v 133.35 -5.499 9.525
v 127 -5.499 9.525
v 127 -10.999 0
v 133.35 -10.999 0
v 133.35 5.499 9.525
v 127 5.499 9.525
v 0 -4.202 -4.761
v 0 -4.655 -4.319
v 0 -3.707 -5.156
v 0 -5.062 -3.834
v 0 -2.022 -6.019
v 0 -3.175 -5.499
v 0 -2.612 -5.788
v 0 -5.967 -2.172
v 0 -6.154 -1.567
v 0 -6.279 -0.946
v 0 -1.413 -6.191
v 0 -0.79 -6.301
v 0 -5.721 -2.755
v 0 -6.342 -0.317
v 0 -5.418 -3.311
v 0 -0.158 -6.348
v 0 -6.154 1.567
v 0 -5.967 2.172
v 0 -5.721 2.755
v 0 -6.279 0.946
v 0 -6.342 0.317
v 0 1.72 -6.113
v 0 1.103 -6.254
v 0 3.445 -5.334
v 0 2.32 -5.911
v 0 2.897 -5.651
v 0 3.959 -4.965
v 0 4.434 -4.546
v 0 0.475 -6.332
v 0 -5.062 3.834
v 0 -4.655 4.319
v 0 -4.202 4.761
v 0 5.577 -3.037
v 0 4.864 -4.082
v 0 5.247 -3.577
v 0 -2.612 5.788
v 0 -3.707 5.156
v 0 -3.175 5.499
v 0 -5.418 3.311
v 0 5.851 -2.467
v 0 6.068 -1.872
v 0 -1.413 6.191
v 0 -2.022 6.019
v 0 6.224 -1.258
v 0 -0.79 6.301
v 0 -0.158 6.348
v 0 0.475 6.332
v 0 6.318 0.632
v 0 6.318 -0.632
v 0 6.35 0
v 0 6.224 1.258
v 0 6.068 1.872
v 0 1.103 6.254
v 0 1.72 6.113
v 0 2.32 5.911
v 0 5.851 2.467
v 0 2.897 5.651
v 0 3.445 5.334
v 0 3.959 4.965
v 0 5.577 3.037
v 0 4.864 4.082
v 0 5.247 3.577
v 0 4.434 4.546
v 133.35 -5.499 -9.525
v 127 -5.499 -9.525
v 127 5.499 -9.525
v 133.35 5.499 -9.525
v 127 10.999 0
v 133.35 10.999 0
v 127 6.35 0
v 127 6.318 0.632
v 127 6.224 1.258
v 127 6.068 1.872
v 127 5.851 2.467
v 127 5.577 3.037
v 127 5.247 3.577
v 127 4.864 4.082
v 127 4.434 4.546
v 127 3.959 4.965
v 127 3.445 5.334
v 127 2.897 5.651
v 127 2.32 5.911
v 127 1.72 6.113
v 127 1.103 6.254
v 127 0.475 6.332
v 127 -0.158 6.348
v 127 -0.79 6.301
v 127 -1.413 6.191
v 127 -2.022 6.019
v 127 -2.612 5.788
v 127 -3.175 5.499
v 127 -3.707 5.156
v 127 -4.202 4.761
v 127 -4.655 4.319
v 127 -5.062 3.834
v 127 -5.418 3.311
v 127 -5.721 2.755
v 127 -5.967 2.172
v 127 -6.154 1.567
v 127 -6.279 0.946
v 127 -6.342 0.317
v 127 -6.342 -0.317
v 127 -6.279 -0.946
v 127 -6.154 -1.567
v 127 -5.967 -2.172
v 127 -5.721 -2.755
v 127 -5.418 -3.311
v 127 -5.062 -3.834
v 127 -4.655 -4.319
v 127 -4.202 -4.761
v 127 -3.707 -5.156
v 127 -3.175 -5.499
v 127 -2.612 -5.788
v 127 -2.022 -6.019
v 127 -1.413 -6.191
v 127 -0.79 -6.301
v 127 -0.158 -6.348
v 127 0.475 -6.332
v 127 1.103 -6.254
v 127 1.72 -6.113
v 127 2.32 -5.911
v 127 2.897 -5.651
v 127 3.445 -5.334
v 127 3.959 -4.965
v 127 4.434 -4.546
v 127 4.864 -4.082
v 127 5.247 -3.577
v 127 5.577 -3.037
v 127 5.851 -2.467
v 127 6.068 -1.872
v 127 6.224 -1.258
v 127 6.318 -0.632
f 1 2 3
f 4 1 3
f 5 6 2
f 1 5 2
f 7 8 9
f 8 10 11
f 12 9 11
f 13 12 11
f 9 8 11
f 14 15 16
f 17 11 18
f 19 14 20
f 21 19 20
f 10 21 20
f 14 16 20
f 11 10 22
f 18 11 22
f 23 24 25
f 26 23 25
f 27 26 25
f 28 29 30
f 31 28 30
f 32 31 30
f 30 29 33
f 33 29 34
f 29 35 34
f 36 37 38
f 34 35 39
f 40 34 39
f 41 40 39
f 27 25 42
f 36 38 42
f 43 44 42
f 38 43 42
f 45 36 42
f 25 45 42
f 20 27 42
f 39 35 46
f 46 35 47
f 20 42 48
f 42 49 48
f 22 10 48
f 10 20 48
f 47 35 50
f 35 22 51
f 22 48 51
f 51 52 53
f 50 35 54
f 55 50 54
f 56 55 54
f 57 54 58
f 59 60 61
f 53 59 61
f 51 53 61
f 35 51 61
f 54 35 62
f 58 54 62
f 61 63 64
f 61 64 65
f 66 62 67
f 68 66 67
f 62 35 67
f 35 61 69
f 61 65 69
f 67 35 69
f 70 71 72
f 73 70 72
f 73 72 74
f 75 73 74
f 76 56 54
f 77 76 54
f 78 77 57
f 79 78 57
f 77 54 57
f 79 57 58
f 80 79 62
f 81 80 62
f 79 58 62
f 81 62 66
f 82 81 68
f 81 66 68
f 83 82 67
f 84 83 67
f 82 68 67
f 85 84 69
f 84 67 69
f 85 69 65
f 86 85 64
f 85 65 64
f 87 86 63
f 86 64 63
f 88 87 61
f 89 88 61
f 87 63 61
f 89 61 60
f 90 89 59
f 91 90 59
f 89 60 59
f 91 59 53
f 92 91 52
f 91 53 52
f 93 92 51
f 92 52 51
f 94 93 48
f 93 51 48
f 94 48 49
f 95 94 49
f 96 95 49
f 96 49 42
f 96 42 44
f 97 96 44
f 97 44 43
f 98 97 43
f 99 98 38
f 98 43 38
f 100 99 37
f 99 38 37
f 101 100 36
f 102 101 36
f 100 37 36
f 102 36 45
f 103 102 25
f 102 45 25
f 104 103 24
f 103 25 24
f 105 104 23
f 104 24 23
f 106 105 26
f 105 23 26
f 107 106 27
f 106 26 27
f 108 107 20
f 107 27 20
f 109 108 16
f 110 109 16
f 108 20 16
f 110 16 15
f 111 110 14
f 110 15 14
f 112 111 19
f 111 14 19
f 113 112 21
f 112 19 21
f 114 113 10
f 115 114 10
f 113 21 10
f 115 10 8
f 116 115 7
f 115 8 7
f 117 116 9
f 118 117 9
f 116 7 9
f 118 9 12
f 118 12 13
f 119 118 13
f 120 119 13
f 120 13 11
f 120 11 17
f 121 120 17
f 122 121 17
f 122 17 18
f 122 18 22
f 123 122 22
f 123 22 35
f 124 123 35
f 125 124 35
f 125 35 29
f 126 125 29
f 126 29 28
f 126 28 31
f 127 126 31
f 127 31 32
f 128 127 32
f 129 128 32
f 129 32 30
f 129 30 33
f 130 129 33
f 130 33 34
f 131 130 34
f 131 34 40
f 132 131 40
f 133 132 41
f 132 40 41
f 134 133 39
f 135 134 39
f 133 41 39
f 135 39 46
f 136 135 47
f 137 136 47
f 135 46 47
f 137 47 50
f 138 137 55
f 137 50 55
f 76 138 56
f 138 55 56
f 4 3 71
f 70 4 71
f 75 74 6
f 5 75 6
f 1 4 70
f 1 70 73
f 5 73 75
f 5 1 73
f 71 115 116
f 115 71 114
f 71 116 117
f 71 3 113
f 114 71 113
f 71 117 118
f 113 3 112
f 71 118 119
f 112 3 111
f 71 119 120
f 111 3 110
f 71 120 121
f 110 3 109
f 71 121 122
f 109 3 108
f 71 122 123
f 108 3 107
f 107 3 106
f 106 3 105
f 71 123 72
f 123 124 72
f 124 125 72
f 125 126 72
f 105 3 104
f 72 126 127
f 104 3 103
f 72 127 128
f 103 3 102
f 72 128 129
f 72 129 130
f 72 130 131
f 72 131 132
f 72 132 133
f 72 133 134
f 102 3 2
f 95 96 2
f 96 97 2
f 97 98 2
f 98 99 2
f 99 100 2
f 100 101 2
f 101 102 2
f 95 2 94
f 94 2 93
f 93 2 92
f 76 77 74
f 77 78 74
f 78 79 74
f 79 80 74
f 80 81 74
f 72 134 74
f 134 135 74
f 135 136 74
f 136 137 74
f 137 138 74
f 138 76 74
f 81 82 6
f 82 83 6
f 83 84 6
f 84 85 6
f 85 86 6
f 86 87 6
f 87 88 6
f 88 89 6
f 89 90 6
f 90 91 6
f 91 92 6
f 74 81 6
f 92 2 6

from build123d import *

# Parameters (mm, degrees)
F0_R     = 6.35
F1_DEPTH = 127
F3_DEPTH = 6.35


with BuildPart() as f1:
    # F0 (on Right) → F1 (new body)
    with BuildSketch(Plane.YZ):
        Circle(F0_R)
    extrude(amount=F1_DEPTH)

    # F2 (on face) → F3 (join)
    with BuildSketch(Plane.YZ.offset(127)):
        Polygon((5.499261, 9.525), (-5.499261, 9.525), (-10.998523, 0), (-5.499261, -9.525), (5.499261, -9.525), (10.998523, 0), align=None)
    extrude(amount=F3_DEPTH)


solid = f1.part
